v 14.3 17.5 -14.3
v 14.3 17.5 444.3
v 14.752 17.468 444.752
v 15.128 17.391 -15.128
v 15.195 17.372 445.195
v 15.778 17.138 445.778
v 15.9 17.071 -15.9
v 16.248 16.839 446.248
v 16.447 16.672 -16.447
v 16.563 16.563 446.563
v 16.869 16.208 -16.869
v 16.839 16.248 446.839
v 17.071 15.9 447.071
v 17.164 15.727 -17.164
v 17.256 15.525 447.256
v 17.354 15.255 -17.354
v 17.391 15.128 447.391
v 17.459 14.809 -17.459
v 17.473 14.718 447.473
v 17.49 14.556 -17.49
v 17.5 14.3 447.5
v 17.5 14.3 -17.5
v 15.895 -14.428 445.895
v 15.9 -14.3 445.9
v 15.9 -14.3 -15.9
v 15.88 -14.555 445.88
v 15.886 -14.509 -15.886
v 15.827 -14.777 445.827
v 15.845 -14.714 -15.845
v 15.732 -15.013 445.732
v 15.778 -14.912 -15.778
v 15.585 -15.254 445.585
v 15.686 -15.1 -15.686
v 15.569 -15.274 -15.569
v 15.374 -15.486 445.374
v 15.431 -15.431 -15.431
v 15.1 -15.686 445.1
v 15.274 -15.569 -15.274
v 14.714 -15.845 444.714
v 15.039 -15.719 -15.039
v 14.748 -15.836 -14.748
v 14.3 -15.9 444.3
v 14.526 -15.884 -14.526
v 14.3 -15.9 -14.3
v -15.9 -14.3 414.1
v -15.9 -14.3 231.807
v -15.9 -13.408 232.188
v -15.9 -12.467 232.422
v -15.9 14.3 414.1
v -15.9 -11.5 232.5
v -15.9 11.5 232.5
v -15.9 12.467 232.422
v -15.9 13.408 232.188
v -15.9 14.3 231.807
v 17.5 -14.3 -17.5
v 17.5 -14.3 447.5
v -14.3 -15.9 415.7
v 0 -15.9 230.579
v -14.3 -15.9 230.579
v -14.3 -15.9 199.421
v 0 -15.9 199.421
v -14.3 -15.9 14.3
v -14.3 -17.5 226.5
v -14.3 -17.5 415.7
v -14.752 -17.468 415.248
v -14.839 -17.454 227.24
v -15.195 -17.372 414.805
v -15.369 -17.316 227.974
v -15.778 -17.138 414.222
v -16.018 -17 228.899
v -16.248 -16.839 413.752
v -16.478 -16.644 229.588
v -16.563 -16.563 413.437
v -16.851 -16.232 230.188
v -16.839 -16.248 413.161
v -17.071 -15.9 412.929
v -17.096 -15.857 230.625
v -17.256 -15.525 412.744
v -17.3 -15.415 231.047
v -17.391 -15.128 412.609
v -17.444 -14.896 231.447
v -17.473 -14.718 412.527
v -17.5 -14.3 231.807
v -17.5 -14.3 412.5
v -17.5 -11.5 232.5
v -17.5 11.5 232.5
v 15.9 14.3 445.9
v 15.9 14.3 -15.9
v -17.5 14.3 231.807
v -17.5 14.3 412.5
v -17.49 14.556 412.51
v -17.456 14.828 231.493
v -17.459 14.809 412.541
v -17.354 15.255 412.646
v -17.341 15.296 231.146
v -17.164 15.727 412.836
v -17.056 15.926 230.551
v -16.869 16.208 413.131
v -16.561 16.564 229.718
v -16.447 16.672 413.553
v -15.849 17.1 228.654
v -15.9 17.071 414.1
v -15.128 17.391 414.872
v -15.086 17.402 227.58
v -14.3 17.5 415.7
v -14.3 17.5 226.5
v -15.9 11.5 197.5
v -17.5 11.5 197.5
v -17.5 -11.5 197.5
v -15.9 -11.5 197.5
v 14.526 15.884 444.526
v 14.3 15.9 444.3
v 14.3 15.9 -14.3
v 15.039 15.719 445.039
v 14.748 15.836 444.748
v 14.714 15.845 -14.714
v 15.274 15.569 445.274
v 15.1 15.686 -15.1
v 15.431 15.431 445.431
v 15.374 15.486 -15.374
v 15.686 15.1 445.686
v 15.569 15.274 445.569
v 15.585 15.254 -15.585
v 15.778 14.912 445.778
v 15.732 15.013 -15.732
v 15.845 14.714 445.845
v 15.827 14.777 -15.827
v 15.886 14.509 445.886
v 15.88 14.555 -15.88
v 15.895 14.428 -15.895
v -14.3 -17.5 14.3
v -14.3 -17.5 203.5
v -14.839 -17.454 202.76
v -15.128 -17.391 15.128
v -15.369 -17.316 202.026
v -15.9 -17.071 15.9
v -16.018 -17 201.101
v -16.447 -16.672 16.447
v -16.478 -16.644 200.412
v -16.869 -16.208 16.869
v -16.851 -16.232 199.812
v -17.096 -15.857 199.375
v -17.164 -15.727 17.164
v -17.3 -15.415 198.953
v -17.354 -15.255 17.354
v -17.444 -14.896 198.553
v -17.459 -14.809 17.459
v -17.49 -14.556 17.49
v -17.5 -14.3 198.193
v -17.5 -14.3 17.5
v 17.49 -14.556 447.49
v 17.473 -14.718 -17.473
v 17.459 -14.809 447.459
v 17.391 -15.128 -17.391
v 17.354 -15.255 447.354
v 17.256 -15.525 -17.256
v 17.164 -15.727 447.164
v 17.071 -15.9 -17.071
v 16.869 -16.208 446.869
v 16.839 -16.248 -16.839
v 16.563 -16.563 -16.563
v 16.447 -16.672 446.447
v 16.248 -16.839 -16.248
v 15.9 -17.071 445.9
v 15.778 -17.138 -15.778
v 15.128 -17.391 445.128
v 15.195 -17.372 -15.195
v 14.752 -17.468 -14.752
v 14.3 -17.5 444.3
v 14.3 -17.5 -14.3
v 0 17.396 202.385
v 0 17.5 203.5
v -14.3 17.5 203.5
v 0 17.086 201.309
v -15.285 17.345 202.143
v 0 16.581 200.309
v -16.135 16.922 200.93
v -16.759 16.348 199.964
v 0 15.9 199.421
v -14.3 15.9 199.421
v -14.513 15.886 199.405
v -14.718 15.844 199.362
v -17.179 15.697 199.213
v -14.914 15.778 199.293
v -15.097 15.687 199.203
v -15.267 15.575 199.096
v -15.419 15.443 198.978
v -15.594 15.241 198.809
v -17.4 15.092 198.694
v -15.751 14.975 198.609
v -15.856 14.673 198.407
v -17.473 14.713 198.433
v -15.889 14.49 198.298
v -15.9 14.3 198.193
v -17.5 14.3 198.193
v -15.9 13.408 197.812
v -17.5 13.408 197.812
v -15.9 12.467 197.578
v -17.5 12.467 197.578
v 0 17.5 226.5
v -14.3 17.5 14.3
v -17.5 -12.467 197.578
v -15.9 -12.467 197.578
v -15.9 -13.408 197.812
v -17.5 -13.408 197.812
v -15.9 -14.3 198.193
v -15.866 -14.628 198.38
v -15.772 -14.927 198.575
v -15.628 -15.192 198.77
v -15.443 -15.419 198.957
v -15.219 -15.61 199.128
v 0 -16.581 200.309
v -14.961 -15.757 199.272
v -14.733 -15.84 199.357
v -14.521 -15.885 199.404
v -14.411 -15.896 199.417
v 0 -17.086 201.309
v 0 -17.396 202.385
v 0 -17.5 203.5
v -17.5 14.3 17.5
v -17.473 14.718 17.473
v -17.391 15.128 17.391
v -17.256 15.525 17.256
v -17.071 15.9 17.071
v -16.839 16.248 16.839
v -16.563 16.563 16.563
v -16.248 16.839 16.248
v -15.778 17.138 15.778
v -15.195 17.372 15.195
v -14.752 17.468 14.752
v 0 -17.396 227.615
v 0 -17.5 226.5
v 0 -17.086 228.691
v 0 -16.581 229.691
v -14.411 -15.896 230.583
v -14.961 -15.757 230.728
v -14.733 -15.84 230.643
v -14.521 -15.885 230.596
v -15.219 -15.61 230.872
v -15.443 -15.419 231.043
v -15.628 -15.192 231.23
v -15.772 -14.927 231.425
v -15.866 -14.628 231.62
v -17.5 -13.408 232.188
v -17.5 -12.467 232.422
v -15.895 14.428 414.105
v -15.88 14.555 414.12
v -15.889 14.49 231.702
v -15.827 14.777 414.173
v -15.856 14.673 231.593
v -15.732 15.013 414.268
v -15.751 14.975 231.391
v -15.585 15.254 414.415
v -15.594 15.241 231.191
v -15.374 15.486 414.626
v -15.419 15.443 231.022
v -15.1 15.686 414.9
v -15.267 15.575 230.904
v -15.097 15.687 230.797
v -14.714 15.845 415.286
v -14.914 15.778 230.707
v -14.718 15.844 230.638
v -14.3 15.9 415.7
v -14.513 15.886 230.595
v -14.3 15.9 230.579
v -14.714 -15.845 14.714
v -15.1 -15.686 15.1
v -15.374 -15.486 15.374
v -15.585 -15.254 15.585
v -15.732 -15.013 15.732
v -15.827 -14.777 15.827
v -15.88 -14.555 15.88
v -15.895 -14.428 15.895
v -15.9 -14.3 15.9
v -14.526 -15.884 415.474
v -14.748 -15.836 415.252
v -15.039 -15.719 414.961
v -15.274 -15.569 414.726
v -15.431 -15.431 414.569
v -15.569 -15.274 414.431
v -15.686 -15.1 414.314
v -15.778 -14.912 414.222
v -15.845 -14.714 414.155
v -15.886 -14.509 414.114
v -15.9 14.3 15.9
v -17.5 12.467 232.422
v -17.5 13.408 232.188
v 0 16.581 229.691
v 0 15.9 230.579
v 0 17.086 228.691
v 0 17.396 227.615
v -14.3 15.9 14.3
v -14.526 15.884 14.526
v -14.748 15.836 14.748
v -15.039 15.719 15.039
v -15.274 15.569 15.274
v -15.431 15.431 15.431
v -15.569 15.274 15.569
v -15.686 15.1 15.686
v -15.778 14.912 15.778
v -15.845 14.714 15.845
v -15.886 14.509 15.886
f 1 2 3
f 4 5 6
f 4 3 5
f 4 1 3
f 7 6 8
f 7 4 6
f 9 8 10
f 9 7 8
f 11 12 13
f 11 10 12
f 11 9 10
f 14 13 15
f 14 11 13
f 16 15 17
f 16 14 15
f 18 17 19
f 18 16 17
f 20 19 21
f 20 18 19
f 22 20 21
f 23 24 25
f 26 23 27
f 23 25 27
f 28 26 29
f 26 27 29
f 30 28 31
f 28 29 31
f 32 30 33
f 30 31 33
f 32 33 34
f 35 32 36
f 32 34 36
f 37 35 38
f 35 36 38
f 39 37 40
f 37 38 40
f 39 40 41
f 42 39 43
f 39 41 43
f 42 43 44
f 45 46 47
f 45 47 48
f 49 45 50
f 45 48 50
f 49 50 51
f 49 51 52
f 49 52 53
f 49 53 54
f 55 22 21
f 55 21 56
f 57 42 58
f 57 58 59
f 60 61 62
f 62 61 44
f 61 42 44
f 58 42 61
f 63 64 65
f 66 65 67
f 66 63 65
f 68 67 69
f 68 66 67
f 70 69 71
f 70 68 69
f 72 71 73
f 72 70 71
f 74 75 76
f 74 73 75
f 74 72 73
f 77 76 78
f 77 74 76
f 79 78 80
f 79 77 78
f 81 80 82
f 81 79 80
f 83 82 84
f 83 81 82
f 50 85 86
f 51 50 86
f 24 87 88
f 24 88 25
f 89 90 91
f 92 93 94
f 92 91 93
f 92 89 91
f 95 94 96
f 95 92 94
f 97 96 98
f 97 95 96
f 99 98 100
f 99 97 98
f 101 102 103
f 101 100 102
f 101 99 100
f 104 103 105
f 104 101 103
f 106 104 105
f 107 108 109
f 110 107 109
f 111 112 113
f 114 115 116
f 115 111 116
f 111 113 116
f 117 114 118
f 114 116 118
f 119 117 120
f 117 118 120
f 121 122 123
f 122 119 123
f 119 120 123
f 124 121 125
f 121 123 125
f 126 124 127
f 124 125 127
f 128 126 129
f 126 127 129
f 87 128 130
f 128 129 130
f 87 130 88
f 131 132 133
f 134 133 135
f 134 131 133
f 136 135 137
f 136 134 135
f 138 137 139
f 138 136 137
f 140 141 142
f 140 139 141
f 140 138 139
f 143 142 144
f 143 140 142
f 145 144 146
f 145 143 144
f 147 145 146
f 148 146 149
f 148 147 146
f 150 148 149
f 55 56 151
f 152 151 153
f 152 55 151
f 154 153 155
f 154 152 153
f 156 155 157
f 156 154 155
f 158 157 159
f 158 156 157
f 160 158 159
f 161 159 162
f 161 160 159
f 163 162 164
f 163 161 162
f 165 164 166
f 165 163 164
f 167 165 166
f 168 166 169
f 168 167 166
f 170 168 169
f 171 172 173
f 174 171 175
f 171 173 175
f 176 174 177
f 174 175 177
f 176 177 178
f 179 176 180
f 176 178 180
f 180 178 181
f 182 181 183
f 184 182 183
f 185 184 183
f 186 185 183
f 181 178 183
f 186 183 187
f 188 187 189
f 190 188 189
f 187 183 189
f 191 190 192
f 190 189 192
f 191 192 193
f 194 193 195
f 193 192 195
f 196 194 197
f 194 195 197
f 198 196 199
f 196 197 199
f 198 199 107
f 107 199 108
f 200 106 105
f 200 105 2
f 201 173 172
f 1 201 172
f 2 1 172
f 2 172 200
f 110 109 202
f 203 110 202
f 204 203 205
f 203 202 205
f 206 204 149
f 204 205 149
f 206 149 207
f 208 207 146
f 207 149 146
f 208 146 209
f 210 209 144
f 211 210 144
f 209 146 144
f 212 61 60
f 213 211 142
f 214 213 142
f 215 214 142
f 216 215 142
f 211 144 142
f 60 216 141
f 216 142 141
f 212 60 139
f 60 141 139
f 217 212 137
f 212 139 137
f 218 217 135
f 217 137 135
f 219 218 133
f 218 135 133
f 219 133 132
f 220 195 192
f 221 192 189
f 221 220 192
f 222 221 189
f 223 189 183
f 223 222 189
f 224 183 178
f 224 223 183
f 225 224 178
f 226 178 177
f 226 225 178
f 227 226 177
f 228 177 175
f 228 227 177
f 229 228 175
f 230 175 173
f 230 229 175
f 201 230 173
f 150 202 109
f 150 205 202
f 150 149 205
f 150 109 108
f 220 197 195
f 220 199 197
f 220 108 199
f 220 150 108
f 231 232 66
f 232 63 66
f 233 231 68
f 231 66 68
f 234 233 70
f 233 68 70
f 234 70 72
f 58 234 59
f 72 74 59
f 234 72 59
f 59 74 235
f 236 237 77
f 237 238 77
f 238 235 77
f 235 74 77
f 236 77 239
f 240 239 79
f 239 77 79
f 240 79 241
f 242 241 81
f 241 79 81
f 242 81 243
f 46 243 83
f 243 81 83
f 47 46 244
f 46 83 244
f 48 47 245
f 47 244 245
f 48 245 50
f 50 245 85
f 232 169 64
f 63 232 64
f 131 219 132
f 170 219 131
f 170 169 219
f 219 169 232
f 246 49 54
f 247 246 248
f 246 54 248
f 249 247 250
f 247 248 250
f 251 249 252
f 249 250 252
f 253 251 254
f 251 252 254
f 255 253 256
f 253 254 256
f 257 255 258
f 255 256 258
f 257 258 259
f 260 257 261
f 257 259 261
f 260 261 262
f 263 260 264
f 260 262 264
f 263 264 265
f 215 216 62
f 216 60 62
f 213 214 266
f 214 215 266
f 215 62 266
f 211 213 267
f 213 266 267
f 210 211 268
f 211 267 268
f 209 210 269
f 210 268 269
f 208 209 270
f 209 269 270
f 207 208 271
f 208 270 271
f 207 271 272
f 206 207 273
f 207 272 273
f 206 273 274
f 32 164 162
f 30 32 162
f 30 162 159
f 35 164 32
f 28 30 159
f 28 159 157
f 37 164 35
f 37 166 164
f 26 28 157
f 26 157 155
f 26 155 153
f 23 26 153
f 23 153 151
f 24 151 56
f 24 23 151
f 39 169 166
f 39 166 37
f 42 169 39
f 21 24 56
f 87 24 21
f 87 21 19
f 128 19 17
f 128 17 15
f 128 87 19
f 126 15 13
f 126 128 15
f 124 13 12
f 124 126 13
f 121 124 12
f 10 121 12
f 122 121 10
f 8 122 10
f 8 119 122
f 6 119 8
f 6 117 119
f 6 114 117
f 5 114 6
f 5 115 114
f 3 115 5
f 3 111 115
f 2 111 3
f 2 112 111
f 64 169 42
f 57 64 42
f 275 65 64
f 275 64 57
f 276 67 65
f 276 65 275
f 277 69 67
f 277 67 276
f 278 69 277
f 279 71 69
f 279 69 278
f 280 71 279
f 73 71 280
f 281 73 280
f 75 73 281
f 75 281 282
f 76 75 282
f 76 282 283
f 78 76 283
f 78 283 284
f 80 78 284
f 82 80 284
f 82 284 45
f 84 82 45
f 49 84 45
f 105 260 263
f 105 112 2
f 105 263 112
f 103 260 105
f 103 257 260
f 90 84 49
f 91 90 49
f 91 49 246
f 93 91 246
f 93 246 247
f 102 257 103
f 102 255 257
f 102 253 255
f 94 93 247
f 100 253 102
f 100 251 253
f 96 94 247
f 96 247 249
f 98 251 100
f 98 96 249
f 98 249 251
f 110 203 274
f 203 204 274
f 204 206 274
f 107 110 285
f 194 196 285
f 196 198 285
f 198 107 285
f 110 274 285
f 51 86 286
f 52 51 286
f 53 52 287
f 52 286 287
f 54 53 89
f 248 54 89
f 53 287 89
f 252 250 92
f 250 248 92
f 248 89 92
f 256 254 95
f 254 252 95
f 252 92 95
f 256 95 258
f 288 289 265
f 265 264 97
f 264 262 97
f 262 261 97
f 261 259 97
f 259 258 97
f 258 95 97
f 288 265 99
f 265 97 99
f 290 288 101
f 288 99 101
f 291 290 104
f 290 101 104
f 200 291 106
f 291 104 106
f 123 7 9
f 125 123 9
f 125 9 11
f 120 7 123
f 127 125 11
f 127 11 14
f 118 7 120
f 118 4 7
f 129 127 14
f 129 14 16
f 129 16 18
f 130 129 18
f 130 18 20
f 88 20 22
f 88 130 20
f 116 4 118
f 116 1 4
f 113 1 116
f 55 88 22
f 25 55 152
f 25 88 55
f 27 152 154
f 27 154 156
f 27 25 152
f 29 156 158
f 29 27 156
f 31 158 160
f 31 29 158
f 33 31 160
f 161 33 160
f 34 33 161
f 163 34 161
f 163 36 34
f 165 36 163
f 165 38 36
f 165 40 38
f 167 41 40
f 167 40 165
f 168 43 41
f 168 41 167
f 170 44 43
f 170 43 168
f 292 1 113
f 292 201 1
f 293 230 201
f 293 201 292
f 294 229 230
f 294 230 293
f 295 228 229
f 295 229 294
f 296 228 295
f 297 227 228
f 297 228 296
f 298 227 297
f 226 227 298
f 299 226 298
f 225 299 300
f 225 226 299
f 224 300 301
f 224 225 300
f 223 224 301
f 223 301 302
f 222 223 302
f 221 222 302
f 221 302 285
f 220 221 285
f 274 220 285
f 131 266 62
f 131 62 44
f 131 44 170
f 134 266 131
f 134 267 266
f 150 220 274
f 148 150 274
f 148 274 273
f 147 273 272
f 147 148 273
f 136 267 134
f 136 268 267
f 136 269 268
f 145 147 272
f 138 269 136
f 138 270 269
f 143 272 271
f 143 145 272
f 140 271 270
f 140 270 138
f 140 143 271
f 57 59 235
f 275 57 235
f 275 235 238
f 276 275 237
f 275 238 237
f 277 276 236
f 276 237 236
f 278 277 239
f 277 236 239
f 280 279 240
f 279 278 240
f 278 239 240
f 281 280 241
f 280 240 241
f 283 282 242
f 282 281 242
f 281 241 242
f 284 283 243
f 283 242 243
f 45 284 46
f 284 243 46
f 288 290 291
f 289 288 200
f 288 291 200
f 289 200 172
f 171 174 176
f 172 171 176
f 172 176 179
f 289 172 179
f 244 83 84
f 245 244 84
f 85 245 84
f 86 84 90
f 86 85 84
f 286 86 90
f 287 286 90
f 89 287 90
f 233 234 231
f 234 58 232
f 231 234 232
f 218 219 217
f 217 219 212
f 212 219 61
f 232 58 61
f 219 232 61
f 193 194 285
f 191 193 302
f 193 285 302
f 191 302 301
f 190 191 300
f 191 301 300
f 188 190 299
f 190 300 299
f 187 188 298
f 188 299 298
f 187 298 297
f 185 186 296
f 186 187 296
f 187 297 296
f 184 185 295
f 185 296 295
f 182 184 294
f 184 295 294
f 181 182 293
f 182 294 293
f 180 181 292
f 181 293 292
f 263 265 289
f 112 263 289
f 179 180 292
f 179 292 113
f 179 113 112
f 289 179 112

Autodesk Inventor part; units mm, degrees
ref_plane "Start plane" through (0, 0, -17.5) normal (0, 0, 1) x (1, 0, 0)
ref_plane "End plane" through (0, 0, 447.5) normal (0, 0, 1) x (1, 0, 0)
sketch "Sketch" plane through (0, 0, 0) normal (0, 0, 1) x (1, 0, 0)
  line L0 (-17.5, -14.3) -> (-17.5, 14.3)
  line L1 (-14.3, 17.5) -> (14.3, 17.5)
  line L2 (17.5, 14.3) -> (17.5, -14.3)
  line L3 (14.3, -17.5) -> (-14.3, -17.5)
  arc A0 (-17.5, -14.3) -> (-14.3, -17.5) centre (-14.3, -14.3) ccw
  arc A1 (-14.3, 17.5) -> (-17.5, 14.3) centre (-14.3, 14.3) ccw
  arc A2 (17.5, 14.3) -> (14.3, 17.5) centre (14.3, 14.3) ccw
  arc A3 (14.3, -17.5) -> (17.5, -14.3) centre (14.3, -14.3) ccw
  arc A4 (-14.3, 15.9) -> (-15.9, 14.3) centre (-14.3, 14.3) ccw
  line L4 (-14.3, 15.9) -> (14.3, 15.9)
  arc A5 (15.9, 14.3) -> (14.3, 15.9) centre (14.3, 14.3) ccw
  line L5 (15.9, 14.3) -> (15.9, -14.3)
  arc A6 (14.3, -15.9) -> (15.9, -14.3) centre (14.3, -14.3) ccw
  line L6 (14.3, -15.9) -> (-14.3, -15.9)
  arc A7 (-15.9, -14.3) -> (-14.3, -15.9) centre (-14.3, -14.3) ccw
  line L7 (-15.9, -14.3) -> (-15.9, 14.3)
  line L8 (0, 25.4278) -> (0, -25.4278) construction
  line L9 (-25.4278, 0) -> (25.4278, 0) construction
  dimension "d7" = 3.2
  dimension "d10" = 35
  dimension "d11" = 35
  dimension "d12" = 1.6
  dimension "d15" = 17.5
  dimension "d16" = 17.5
extrude "Body" add sketch "Sketch" along normal up to surface (465 mm away) from surface at -17.5
sketch "Sketch3" plane through (0, 0, 0) normal (0, 0, 1) x (1, 0, 0)
  line L0 (0, 0) -> (10, 0)
ref_plane "Work Plane3" through (0, 0, 0) normal (0, -1, 0) x (1, 0, 0)
sketch "Sketch4" plane through (0, 0, 0) normal (0, -1, 0) x (1, 0, 0)
  line L0 (-2, -17.5) -> (12, -17.5)
  line L1 (-2, 447.5) -> (12, 447.5)
  dimension "d18" = 465
ref_plane "Work Plane4" through (17.5, 0, 447.5) normal (-0.7071, 0, 0.7071) x (0.7071, 0, 0.7071)
split "Split1" plane through (17.5, 0, 447.5) removes the side toward (-0.7071, 0, 0.7071)
ref_plane "Work Plane5" through (17.5, 0, -17.5) normal (-0.7071, 0, -0.7071) x (-0.7071, 0, 0.7071)
split "Split2" plane through (17.5, 0, -17.5) removes the side toward (-0.7071, 0, -0.7071)
ref_plane "Work Plane6" through (-730, 0, 215) normal (1, 0, 0) x (0, 0, -1)
ref_plane "Work Plane7" through (0, 0, 215) normal (1, 0, 0) x (0, 0, -1)
ref_plane "Work Plane8" through (-365, 0, 215) normal (1, 0, 0) x (0, 0, -1)
sketch "Sketch5" plane through (-365, 0, 215) normal (1, 0, 0) x (0, 0, -1)
  arc A0 (-17.5, -11.5) -> (-11.5, -17.5) centre (-11.5, -11.5) ccw
  line L0 (-17.5, -11.5) -> (-17.5, 11.5)
  arc A1 (-11.5, 17.5) -> (-17.5, 11.5) centre (-11.5, 11.5) ccw
  line L1 (-11.5, 17.5) -> (11.5, 17.5)
  arc A2 (17.5, 11.5) -> (11.5, 17.5) centre (11.5, 11.5) ccw
  line L2 (17.5, 11.5) -> (17.5, -11.5)
  arc A3 (11.5, -17.5) -> (17.5, -11.5) centre (11.5, -11.5) ccw
  line L3 (11.5, -17.5) -> (-11.5, -17.5)
  arc A4 (-11.5, 14.5) -> (-14.5, 11.5) centre (-11.5, 11.5) ccw
  line L4 (-11.5, 14.5) -> (11.5, 14.5)
  arc A5 (14.5, 11.5) -> (11.5, 14.5) centre (11.5, 11.5) ccw
  line L5 (14.5, 11.5) -> (14.5, -11.5)
  arc A6 (11.5, -14.5) -> (14.5, -11.5) centre (11.5, -11.5) ccw
  line L6 (11.5, -14.5) -> (-11.5, -14.5)
  arc A7 (-14.5, -11.5) -> (-11.5, -14.5) centre (-11.5, -11.5) ccw
  line L7 (-14.5, -11.5) -> (-14.5, 11.5)
extrude "Extrusion2" cut sketch "Sketch5" along normal up to surface (730 mm away) from surface at -365 contours L0 A1 L1 A2 L2 A3 L3 A0 | L4 A5 L5 A6 L6 A7 L7 A4
equation "\"d7\" = G_IR"
equation "\"d10\" = G_H"
equation "\"d11\" = G_W"
equation "\"d12\" = G_T"
equation "\"d15\" = 0.5 * d10"
equation "\"d16\" = 0.5 * d11"
equation "\"d3\" = G_L"
equation "\"G_W\" = 35"
equation "\"G_H\" = 35"
equation "\"G_T\" = 1.6"
equation "\"G_IR\" = 3.2"
equation "\"G_L\" = d18"
equation "\"G_OFFSET_START\" = 17.5"
equation "\"G_OFFSET_END\" = 17.5"
equation "\"d13\" = -G_OFFSET_START"
equation "\"d14\" = G_OFFSET_END + B_L"
equation "\"B_L\" = 430"
properties part number "AS C350L0 35x35x3.0 SHS 00000050" material "Steel, Mild"
